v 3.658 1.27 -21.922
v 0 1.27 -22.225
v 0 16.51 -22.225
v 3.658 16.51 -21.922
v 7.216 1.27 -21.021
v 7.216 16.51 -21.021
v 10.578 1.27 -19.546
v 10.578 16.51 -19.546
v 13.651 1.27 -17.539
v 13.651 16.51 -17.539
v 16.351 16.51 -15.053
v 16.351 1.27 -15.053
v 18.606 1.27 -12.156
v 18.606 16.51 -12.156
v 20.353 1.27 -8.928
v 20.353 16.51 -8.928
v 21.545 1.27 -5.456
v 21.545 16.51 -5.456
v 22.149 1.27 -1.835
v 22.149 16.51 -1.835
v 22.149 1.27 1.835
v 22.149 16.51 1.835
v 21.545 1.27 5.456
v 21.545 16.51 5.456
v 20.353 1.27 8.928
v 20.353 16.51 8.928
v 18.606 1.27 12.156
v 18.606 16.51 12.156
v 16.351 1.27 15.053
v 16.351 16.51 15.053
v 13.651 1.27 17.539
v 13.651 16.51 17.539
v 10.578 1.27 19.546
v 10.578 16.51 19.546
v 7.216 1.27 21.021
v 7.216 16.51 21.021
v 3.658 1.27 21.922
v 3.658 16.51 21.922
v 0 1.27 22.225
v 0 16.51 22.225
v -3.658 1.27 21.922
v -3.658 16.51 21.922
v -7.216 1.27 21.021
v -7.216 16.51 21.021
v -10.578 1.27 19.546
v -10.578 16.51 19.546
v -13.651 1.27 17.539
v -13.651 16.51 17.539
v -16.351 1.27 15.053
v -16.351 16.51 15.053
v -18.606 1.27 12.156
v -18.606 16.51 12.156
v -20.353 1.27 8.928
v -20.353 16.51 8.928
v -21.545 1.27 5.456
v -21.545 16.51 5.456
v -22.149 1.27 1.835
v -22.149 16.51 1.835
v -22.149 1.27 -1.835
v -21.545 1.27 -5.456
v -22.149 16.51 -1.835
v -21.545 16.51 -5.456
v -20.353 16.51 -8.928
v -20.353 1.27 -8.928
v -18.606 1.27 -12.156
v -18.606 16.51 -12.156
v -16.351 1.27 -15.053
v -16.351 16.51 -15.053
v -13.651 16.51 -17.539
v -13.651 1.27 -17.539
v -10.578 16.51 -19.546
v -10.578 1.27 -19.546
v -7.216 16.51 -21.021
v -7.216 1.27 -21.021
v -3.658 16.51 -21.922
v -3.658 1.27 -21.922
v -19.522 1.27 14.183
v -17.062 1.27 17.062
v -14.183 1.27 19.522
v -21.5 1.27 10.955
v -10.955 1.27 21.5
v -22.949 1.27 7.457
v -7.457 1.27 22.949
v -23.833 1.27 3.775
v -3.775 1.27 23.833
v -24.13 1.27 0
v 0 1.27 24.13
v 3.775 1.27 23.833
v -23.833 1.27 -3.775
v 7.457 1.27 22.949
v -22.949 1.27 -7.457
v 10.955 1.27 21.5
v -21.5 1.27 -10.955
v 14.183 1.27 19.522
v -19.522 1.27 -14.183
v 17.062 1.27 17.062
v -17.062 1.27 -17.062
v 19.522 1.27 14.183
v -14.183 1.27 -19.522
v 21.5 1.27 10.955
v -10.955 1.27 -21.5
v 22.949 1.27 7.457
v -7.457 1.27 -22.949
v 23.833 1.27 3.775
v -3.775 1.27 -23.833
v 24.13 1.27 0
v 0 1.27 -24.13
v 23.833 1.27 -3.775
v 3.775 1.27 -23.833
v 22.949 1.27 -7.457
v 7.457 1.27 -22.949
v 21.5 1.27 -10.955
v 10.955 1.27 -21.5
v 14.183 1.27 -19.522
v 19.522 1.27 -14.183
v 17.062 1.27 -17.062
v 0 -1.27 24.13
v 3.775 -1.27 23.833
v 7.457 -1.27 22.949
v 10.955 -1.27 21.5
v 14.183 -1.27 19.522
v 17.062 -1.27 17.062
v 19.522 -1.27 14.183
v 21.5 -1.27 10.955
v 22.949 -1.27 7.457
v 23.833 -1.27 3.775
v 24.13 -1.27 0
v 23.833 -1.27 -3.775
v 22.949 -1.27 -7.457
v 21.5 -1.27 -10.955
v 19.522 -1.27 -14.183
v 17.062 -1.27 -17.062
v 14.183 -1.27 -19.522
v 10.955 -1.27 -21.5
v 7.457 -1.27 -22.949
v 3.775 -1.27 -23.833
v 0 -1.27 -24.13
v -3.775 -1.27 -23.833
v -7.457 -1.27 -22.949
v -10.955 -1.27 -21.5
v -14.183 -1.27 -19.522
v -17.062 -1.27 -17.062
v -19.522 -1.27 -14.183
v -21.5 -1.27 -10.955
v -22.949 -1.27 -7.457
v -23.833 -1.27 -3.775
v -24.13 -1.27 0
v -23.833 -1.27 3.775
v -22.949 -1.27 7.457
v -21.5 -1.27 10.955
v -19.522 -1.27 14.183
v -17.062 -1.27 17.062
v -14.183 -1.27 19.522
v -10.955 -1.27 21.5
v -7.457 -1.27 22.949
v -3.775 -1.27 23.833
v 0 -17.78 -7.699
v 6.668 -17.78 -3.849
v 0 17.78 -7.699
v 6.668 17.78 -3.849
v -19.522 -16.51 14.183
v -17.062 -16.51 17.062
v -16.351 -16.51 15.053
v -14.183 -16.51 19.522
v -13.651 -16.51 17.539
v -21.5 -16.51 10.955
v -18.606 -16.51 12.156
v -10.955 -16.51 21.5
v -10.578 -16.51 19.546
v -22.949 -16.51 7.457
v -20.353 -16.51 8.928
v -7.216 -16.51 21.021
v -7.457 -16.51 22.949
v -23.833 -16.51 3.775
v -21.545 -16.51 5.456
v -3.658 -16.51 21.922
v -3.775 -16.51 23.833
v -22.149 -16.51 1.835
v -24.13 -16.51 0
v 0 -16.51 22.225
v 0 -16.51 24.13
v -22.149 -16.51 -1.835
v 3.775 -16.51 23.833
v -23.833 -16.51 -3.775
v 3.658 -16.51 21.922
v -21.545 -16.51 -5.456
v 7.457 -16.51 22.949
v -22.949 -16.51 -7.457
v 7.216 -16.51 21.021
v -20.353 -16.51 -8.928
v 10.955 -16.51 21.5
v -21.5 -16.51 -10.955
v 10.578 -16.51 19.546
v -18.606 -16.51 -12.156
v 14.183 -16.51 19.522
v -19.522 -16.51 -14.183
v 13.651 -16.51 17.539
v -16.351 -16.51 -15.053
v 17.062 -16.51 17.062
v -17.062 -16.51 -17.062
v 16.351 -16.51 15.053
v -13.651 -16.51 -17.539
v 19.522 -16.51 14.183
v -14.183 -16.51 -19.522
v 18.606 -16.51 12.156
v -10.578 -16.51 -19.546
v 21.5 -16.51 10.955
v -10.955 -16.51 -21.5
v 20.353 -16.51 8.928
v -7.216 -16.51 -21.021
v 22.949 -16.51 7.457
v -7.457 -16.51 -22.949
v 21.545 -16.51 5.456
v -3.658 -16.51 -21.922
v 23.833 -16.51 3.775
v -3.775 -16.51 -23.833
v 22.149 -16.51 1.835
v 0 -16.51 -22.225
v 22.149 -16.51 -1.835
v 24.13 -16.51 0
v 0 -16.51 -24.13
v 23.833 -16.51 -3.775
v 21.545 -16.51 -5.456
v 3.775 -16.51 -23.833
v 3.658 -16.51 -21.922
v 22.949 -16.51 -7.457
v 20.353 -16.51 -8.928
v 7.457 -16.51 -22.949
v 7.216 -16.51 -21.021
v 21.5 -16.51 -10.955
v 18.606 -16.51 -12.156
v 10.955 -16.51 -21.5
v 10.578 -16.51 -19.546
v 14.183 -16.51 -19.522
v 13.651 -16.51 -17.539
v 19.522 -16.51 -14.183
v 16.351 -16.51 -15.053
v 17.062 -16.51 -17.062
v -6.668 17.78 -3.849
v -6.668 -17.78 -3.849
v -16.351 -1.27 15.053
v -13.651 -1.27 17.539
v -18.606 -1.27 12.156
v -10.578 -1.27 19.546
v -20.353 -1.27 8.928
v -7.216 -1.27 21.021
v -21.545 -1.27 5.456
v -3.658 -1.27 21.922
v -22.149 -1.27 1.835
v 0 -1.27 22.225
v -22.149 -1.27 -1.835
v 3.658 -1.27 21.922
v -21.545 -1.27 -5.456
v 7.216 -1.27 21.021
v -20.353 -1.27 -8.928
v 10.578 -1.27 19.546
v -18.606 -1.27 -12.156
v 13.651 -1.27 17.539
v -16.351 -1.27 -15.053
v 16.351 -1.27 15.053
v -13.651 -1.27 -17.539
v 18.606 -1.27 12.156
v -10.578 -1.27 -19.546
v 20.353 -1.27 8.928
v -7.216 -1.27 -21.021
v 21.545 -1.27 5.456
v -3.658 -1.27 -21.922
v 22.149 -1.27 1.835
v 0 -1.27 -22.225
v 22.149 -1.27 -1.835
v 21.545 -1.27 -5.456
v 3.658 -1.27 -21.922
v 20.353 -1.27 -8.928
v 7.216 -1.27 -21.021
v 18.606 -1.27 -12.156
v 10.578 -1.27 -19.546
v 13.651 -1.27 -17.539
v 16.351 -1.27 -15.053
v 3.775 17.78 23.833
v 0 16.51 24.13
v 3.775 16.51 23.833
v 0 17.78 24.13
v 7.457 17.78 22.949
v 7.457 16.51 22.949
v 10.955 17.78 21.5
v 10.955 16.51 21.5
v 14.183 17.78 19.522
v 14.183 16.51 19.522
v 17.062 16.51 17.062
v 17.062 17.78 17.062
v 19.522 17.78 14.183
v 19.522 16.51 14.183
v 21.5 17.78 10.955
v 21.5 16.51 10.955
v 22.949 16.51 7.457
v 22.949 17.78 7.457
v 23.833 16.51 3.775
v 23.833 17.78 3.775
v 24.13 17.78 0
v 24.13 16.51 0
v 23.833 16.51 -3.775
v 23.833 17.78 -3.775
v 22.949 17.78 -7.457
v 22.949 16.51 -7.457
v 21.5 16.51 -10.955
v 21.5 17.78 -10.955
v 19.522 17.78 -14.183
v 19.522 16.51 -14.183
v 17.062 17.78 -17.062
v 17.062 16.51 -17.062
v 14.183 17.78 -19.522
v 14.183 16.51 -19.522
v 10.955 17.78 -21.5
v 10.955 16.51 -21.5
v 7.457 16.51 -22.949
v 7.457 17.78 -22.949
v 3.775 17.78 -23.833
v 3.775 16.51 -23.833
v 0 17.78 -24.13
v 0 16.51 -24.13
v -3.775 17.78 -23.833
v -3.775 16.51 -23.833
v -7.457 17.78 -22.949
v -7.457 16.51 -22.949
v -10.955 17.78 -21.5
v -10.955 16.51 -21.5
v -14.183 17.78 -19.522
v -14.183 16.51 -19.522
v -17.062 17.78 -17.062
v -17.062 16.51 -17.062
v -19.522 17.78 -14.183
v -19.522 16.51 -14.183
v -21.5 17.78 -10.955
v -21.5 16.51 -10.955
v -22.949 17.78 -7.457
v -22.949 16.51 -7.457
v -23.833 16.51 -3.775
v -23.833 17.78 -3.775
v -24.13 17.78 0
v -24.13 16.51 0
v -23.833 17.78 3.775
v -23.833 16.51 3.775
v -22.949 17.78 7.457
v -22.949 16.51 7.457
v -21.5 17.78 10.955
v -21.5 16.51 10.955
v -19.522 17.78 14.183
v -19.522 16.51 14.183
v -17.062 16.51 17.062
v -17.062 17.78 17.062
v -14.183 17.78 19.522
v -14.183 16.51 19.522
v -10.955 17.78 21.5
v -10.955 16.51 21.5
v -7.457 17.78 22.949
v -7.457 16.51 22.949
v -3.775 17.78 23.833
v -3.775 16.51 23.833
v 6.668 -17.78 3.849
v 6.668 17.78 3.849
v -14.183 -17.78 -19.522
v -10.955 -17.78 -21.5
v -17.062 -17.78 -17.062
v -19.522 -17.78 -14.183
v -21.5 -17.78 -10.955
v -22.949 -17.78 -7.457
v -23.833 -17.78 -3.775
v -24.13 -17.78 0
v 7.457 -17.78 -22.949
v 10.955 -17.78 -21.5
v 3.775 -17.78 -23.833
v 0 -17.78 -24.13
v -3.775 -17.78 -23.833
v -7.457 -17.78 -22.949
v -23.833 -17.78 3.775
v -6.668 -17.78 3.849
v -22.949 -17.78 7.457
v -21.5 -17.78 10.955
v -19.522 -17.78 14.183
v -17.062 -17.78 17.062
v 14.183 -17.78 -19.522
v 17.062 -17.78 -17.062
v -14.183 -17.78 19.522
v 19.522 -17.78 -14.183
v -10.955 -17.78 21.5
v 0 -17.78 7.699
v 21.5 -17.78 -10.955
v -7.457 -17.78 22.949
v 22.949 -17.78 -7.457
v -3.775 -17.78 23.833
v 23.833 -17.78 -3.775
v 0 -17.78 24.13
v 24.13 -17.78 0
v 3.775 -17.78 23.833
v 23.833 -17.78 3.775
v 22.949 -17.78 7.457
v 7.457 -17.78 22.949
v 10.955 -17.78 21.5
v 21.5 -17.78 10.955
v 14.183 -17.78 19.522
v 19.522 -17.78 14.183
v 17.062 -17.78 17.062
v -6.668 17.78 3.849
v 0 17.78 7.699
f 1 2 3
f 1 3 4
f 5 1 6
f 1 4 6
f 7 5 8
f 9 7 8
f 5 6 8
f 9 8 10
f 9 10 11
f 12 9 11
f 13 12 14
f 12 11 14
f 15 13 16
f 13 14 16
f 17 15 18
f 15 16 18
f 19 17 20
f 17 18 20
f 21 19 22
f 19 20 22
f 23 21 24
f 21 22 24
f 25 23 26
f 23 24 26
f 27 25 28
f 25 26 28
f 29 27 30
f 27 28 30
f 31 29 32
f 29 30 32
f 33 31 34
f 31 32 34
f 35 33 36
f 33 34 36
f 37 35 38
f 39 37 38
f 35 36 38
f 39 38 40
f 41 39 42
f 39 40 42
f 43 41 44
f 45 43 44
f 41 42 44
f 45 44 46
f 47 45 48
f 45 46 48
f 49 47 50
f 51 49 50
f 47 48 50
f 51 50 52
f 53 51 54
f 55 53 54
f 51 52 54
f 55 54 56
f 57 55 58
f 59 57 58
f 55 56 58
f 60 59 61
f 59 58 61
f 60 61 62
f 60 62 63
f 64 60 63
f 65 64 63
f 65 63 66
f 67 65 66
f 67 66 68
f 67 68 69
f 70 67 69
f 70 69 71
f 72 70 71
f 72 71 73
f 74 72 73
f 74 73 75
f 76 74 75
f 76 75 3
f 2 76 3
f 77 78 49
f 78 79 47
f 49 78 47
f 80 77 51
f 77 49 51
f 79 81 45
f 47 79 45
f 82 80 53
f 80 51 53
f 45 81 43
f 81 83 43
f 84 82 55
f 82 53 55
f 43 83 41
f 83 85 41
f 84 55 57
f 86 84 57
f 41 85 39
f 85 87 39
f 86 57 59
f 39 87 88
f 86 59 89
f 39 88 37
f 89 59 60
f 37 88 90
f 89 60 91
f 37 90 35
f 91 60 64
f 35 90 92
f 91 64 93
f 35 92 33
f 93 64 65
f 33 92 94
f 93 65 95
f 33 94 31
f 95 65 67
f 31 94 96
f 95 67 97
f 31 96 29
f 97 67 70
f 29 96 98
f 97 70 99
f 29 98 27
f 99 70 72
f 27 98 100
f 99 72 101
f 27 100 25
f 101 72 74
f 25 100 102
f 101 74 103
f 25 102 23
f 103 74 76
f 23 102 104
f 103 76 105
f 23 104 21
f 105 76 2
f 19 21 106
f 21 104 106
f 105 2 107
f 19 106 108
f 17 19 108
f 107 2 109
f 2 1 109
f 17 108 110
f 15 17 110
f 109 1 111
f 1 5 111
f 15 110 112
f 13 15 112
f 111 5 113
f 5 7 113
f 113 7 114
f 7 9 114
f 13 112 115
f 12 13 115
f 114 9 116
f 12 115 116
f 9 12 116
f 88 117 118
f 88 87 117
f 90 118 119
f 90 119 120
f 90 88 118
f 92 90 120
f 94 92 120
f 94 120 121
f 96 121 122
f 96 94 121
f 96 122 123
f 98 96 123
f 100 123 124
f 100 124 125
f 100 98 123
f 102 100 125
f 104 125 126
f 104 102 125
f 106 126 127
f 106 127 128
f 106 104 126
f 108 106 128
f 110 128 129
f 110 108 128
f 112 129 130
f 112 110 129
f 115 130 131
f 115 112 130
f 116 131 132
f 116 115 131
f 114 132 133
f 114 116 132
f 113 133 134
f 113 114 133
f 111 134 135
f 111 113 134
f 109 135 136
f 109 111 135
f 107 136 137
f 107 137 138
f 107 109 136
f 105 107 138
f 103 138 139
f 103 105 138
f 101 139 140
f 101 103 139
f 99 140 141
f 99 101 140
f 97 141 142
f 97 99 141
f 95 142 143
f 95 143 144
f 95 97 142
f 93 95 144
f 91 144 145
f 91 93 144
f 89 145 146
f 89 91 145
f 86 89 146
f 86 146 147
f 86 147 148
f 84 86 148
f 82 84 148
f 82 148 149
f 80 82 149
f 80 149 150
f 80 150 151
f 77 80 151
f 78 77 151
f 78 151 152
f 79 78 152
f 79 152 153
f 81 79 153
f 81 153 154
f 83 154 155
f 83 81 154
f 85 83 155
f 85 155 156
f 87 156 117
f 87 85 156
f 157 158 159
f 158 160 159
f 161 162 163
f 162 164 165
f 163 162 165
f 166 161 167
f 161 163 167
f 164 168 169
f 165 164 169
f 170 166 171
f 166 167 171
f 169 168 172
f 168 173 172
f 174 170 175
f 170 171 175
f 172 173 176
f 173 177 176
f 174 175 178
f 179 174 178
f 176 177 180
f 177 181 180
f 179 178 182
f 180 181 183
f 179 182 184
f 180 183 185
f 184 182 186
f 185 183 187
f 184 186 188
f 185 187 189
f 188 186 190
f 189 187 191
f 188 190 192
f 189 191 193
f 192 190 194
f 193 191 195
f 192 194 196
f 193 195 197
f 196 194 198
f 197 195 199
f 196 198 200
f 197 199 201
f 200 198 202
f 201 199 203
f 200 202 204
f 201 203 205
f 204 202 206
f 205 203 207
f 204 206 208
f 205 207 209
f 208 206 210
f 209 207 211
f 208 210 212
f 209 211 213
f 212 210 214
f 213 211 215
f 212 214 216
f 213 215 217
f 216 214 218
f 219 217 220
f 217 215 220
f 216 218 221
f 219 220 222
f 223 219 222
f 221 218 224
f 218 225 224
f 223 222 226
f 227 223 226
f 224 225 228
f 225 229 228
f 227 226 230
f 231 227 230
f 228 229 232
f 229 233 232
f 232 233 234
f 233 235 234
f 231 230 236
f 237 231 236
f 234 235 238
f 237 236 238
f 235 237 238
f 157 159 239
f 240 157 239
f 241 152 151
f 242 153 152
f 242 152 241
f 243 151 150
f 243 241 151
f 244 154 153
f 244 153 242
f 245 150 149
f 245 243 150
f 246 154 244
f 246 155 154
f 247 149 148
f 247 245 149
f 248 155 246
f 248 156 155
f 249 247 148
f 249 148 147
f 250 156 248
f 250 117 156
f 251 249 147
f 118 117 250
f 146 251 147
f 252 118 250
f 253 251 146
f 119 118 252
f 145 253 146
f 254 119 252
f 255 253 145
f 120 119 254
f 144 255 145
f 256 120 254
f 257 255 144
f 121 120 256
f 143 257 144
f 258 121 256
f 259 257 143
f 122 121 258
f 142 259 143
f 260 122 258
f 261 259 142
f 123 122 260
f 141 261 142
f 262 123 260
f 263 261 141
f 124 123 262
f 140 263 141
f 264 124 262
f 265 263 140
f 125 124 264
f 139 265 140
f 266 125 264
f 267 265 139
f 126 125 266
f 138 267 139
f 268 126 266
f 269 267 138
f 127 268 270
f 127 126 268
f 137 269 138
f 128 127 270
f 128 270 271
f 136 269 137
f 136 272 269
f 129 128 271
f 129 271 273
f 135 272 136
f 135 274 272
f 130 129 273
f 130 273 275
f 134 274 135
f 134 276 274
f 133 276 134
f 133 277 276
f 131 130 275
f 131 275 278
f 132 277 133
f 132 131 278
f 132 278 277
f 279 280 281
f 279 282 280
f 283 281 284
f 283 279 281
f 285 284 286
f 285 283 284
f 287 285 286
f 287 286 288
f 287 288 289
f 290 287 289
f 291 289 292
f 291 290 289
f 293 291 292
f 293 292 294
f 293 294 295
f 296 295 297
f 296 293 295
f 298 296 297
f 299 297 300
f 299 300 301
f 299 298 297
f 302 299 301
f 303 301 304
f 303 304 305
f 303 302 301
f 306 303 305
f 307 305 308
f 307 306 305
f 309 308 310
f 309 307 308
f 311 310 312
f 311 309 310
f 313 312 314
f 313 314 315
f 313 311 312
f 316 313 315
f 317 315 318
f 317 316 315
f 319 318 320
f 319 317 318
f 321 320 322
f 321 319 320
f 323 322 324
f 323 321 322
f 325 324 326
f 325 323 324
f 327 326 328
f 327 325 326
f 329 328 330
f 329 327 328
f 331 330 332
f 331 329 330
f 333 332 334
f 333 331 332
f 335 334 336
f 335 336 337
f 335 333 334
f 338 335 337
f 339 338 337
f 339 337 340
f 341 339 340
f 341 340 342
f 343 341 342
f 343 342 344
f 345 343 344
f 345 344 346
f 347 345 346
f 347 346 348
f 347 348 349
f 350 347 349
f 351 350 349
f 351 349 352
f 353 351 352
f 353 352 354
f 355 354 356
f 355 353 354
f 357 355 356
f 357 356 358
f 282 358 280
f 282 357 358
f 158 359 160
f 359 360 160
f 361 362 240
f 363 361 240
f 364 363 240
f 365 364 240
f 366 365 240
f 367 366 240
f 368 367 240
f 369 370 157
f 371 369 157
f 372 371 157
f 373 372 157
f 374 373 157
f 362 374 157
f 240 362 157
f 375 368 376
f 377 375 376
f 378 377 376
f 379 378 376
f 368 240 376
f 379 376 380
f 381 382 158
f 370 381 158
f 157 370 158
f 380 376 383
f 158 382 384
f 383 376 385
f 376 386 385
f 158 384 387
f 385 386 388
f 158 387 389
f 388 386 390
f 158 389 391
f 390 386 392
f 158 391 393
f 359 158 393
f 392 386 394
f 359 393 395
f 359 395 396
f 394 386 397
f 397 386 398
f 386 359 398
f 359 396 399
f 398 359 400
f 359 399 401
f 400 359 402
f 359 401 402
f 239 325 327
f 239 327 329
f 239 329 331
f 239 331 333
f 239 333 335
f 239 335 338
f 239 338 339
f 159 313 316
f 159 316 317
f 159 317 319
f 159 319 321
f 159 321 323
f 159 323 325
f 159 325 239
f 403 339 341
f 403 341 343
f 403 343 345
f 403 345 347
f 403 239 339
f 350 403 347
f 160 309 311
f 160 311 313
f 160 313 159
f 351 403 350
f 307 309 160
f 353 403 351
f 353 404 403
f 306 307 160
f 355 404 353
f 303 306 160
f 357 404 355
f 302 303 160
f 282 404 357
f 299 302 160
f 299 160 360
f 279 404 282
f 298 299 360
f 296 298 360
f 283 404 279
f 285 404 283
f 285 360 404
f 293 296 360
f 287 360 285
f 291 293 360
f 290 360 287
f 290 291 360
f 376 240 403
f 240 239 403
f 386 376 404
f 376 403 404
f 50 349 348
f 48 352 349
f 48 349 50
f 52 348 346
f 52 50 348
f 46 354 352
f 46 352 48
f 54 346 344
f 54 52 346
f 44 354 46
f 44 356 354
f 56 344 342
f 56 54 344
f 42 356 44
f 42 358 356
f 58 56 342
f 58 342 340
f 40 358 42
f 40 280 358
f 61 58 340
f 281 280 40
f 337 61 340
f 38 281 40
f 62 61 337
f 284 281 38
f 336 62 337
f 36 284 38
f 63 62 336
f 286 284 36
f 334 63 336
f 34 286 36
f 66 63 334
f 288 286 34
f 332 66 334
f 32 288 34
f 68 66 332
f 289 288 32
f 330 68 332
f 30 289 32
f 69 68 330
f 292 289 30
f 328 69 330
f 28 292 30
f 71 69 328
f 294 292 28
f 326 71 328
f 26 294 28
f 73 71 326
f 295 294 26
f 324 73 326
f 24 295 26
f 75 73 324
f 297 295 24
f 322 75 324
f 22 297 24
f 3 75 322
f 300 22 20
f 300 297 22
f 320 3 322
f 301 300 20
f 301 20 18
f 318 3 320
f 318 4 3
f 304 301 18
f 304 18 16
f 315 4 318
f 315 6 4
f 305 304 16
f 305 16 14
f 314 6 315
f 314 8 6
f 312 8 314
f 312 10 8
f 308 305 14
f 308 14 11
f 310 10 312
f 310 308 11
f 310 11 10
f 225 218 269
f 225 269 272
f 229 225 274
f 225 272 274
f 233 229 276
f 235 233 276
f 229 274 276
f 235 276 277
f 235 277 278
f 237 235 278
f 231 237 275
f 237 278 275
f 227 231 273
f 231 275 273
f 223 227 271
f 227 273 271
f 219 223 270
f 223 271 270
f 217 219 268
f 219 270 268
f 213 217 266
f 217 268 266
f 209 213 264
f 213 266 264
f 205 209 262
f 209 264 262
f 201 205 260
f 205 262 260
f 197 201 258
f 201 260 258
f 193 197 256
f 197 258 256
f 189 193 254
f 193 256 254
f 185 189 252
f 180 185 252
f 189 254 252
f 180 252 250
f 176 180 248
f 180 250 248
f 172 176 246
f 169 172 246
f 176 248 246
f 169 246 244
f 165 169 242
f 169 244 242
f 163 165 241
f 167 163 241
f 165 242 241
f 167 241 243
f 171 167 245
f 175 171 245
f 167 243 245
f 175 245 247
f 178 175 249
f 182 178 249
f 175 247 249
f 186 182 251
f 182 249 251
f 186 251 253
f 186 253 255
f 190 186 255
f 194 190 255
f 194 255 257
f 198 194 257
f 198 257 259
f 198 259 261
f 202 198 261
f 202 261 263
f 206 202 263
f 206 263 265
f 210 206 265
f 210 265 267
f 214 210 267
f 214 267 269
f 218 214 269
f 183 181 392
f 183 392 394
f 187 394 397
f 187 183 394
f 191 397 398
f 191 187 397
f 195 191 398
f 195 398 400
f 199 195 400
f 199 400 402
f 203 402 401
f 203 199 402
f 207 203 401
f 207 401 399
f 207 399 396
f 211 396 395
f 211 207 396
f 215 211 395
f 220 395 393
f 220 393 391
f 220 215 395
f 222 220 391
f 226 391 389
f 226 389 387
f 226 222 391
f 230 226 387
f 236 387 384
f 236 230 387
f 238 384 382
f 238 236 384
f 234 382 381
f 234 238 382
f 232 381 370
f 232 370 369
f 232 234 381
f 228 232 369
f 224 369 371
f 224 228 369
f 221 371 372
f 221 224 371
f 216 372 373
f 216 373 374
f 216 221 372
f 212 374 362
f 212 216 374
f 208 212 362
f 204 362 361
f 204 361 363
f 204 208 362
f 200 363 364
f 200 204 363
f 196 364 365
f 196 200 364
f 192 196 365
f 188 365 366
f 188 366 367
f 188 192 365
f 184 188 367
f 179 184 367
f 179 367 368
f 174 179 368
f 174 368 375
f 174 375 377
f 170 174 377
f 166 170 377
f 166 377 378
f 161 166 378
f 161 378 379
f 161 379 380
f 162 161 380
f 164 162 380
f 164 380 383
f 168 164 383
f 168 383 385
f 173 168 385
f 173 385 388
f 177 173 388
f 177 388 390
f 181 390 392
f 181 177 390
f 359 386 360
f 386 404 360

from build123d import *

# Parameters (mm, degrees)
SKETCH1_R           = 24.13
BOSS_EXTRUDE1_DEPTH = 17.78
SKETCH2_W           = 3.81
SKETCH2_H           = 15.24


with BuildPart() as part:
    # Sketch1 → Boss-Extrude1 (new, symmetric)
    with BuildSketch(Plane(origin=(0, 0, 0), x_dir=(1, 0, 0), z_dir=(0, 1, 0))):
        Circle(SKETCH1_R)
        Polygon((-6.6675, 3.84948292), (0, 7.69896584), (2.709533295, 6.134616063), (6.6675, 3.84948292), (6.6675, -3.84948292), (0, -7.69896584), (-6.6675, -3.84948292), align=None, mode=Mode.SUBTRACT)
    extrude(amount=BOSS_EXTRUDE1_DEPTH, both=True)

    # Sketch2 → Cut-Revolve1 (revolve, cut)
    with BuildSketch(Plane.XY):
        with Locations((-24.13, -8.89)):
            Rectangle(SKETCH2_W, SKETCH2_H)
        with Locations((-24.13, 8.89)):
            Rectangle(SKETCH2_W, SKETCH2_H)
    revolve(axis=Axis((0, 17.78, 0), (0, -1, 0)), mode=Mode.SUBTRACT)


solid = part.part
